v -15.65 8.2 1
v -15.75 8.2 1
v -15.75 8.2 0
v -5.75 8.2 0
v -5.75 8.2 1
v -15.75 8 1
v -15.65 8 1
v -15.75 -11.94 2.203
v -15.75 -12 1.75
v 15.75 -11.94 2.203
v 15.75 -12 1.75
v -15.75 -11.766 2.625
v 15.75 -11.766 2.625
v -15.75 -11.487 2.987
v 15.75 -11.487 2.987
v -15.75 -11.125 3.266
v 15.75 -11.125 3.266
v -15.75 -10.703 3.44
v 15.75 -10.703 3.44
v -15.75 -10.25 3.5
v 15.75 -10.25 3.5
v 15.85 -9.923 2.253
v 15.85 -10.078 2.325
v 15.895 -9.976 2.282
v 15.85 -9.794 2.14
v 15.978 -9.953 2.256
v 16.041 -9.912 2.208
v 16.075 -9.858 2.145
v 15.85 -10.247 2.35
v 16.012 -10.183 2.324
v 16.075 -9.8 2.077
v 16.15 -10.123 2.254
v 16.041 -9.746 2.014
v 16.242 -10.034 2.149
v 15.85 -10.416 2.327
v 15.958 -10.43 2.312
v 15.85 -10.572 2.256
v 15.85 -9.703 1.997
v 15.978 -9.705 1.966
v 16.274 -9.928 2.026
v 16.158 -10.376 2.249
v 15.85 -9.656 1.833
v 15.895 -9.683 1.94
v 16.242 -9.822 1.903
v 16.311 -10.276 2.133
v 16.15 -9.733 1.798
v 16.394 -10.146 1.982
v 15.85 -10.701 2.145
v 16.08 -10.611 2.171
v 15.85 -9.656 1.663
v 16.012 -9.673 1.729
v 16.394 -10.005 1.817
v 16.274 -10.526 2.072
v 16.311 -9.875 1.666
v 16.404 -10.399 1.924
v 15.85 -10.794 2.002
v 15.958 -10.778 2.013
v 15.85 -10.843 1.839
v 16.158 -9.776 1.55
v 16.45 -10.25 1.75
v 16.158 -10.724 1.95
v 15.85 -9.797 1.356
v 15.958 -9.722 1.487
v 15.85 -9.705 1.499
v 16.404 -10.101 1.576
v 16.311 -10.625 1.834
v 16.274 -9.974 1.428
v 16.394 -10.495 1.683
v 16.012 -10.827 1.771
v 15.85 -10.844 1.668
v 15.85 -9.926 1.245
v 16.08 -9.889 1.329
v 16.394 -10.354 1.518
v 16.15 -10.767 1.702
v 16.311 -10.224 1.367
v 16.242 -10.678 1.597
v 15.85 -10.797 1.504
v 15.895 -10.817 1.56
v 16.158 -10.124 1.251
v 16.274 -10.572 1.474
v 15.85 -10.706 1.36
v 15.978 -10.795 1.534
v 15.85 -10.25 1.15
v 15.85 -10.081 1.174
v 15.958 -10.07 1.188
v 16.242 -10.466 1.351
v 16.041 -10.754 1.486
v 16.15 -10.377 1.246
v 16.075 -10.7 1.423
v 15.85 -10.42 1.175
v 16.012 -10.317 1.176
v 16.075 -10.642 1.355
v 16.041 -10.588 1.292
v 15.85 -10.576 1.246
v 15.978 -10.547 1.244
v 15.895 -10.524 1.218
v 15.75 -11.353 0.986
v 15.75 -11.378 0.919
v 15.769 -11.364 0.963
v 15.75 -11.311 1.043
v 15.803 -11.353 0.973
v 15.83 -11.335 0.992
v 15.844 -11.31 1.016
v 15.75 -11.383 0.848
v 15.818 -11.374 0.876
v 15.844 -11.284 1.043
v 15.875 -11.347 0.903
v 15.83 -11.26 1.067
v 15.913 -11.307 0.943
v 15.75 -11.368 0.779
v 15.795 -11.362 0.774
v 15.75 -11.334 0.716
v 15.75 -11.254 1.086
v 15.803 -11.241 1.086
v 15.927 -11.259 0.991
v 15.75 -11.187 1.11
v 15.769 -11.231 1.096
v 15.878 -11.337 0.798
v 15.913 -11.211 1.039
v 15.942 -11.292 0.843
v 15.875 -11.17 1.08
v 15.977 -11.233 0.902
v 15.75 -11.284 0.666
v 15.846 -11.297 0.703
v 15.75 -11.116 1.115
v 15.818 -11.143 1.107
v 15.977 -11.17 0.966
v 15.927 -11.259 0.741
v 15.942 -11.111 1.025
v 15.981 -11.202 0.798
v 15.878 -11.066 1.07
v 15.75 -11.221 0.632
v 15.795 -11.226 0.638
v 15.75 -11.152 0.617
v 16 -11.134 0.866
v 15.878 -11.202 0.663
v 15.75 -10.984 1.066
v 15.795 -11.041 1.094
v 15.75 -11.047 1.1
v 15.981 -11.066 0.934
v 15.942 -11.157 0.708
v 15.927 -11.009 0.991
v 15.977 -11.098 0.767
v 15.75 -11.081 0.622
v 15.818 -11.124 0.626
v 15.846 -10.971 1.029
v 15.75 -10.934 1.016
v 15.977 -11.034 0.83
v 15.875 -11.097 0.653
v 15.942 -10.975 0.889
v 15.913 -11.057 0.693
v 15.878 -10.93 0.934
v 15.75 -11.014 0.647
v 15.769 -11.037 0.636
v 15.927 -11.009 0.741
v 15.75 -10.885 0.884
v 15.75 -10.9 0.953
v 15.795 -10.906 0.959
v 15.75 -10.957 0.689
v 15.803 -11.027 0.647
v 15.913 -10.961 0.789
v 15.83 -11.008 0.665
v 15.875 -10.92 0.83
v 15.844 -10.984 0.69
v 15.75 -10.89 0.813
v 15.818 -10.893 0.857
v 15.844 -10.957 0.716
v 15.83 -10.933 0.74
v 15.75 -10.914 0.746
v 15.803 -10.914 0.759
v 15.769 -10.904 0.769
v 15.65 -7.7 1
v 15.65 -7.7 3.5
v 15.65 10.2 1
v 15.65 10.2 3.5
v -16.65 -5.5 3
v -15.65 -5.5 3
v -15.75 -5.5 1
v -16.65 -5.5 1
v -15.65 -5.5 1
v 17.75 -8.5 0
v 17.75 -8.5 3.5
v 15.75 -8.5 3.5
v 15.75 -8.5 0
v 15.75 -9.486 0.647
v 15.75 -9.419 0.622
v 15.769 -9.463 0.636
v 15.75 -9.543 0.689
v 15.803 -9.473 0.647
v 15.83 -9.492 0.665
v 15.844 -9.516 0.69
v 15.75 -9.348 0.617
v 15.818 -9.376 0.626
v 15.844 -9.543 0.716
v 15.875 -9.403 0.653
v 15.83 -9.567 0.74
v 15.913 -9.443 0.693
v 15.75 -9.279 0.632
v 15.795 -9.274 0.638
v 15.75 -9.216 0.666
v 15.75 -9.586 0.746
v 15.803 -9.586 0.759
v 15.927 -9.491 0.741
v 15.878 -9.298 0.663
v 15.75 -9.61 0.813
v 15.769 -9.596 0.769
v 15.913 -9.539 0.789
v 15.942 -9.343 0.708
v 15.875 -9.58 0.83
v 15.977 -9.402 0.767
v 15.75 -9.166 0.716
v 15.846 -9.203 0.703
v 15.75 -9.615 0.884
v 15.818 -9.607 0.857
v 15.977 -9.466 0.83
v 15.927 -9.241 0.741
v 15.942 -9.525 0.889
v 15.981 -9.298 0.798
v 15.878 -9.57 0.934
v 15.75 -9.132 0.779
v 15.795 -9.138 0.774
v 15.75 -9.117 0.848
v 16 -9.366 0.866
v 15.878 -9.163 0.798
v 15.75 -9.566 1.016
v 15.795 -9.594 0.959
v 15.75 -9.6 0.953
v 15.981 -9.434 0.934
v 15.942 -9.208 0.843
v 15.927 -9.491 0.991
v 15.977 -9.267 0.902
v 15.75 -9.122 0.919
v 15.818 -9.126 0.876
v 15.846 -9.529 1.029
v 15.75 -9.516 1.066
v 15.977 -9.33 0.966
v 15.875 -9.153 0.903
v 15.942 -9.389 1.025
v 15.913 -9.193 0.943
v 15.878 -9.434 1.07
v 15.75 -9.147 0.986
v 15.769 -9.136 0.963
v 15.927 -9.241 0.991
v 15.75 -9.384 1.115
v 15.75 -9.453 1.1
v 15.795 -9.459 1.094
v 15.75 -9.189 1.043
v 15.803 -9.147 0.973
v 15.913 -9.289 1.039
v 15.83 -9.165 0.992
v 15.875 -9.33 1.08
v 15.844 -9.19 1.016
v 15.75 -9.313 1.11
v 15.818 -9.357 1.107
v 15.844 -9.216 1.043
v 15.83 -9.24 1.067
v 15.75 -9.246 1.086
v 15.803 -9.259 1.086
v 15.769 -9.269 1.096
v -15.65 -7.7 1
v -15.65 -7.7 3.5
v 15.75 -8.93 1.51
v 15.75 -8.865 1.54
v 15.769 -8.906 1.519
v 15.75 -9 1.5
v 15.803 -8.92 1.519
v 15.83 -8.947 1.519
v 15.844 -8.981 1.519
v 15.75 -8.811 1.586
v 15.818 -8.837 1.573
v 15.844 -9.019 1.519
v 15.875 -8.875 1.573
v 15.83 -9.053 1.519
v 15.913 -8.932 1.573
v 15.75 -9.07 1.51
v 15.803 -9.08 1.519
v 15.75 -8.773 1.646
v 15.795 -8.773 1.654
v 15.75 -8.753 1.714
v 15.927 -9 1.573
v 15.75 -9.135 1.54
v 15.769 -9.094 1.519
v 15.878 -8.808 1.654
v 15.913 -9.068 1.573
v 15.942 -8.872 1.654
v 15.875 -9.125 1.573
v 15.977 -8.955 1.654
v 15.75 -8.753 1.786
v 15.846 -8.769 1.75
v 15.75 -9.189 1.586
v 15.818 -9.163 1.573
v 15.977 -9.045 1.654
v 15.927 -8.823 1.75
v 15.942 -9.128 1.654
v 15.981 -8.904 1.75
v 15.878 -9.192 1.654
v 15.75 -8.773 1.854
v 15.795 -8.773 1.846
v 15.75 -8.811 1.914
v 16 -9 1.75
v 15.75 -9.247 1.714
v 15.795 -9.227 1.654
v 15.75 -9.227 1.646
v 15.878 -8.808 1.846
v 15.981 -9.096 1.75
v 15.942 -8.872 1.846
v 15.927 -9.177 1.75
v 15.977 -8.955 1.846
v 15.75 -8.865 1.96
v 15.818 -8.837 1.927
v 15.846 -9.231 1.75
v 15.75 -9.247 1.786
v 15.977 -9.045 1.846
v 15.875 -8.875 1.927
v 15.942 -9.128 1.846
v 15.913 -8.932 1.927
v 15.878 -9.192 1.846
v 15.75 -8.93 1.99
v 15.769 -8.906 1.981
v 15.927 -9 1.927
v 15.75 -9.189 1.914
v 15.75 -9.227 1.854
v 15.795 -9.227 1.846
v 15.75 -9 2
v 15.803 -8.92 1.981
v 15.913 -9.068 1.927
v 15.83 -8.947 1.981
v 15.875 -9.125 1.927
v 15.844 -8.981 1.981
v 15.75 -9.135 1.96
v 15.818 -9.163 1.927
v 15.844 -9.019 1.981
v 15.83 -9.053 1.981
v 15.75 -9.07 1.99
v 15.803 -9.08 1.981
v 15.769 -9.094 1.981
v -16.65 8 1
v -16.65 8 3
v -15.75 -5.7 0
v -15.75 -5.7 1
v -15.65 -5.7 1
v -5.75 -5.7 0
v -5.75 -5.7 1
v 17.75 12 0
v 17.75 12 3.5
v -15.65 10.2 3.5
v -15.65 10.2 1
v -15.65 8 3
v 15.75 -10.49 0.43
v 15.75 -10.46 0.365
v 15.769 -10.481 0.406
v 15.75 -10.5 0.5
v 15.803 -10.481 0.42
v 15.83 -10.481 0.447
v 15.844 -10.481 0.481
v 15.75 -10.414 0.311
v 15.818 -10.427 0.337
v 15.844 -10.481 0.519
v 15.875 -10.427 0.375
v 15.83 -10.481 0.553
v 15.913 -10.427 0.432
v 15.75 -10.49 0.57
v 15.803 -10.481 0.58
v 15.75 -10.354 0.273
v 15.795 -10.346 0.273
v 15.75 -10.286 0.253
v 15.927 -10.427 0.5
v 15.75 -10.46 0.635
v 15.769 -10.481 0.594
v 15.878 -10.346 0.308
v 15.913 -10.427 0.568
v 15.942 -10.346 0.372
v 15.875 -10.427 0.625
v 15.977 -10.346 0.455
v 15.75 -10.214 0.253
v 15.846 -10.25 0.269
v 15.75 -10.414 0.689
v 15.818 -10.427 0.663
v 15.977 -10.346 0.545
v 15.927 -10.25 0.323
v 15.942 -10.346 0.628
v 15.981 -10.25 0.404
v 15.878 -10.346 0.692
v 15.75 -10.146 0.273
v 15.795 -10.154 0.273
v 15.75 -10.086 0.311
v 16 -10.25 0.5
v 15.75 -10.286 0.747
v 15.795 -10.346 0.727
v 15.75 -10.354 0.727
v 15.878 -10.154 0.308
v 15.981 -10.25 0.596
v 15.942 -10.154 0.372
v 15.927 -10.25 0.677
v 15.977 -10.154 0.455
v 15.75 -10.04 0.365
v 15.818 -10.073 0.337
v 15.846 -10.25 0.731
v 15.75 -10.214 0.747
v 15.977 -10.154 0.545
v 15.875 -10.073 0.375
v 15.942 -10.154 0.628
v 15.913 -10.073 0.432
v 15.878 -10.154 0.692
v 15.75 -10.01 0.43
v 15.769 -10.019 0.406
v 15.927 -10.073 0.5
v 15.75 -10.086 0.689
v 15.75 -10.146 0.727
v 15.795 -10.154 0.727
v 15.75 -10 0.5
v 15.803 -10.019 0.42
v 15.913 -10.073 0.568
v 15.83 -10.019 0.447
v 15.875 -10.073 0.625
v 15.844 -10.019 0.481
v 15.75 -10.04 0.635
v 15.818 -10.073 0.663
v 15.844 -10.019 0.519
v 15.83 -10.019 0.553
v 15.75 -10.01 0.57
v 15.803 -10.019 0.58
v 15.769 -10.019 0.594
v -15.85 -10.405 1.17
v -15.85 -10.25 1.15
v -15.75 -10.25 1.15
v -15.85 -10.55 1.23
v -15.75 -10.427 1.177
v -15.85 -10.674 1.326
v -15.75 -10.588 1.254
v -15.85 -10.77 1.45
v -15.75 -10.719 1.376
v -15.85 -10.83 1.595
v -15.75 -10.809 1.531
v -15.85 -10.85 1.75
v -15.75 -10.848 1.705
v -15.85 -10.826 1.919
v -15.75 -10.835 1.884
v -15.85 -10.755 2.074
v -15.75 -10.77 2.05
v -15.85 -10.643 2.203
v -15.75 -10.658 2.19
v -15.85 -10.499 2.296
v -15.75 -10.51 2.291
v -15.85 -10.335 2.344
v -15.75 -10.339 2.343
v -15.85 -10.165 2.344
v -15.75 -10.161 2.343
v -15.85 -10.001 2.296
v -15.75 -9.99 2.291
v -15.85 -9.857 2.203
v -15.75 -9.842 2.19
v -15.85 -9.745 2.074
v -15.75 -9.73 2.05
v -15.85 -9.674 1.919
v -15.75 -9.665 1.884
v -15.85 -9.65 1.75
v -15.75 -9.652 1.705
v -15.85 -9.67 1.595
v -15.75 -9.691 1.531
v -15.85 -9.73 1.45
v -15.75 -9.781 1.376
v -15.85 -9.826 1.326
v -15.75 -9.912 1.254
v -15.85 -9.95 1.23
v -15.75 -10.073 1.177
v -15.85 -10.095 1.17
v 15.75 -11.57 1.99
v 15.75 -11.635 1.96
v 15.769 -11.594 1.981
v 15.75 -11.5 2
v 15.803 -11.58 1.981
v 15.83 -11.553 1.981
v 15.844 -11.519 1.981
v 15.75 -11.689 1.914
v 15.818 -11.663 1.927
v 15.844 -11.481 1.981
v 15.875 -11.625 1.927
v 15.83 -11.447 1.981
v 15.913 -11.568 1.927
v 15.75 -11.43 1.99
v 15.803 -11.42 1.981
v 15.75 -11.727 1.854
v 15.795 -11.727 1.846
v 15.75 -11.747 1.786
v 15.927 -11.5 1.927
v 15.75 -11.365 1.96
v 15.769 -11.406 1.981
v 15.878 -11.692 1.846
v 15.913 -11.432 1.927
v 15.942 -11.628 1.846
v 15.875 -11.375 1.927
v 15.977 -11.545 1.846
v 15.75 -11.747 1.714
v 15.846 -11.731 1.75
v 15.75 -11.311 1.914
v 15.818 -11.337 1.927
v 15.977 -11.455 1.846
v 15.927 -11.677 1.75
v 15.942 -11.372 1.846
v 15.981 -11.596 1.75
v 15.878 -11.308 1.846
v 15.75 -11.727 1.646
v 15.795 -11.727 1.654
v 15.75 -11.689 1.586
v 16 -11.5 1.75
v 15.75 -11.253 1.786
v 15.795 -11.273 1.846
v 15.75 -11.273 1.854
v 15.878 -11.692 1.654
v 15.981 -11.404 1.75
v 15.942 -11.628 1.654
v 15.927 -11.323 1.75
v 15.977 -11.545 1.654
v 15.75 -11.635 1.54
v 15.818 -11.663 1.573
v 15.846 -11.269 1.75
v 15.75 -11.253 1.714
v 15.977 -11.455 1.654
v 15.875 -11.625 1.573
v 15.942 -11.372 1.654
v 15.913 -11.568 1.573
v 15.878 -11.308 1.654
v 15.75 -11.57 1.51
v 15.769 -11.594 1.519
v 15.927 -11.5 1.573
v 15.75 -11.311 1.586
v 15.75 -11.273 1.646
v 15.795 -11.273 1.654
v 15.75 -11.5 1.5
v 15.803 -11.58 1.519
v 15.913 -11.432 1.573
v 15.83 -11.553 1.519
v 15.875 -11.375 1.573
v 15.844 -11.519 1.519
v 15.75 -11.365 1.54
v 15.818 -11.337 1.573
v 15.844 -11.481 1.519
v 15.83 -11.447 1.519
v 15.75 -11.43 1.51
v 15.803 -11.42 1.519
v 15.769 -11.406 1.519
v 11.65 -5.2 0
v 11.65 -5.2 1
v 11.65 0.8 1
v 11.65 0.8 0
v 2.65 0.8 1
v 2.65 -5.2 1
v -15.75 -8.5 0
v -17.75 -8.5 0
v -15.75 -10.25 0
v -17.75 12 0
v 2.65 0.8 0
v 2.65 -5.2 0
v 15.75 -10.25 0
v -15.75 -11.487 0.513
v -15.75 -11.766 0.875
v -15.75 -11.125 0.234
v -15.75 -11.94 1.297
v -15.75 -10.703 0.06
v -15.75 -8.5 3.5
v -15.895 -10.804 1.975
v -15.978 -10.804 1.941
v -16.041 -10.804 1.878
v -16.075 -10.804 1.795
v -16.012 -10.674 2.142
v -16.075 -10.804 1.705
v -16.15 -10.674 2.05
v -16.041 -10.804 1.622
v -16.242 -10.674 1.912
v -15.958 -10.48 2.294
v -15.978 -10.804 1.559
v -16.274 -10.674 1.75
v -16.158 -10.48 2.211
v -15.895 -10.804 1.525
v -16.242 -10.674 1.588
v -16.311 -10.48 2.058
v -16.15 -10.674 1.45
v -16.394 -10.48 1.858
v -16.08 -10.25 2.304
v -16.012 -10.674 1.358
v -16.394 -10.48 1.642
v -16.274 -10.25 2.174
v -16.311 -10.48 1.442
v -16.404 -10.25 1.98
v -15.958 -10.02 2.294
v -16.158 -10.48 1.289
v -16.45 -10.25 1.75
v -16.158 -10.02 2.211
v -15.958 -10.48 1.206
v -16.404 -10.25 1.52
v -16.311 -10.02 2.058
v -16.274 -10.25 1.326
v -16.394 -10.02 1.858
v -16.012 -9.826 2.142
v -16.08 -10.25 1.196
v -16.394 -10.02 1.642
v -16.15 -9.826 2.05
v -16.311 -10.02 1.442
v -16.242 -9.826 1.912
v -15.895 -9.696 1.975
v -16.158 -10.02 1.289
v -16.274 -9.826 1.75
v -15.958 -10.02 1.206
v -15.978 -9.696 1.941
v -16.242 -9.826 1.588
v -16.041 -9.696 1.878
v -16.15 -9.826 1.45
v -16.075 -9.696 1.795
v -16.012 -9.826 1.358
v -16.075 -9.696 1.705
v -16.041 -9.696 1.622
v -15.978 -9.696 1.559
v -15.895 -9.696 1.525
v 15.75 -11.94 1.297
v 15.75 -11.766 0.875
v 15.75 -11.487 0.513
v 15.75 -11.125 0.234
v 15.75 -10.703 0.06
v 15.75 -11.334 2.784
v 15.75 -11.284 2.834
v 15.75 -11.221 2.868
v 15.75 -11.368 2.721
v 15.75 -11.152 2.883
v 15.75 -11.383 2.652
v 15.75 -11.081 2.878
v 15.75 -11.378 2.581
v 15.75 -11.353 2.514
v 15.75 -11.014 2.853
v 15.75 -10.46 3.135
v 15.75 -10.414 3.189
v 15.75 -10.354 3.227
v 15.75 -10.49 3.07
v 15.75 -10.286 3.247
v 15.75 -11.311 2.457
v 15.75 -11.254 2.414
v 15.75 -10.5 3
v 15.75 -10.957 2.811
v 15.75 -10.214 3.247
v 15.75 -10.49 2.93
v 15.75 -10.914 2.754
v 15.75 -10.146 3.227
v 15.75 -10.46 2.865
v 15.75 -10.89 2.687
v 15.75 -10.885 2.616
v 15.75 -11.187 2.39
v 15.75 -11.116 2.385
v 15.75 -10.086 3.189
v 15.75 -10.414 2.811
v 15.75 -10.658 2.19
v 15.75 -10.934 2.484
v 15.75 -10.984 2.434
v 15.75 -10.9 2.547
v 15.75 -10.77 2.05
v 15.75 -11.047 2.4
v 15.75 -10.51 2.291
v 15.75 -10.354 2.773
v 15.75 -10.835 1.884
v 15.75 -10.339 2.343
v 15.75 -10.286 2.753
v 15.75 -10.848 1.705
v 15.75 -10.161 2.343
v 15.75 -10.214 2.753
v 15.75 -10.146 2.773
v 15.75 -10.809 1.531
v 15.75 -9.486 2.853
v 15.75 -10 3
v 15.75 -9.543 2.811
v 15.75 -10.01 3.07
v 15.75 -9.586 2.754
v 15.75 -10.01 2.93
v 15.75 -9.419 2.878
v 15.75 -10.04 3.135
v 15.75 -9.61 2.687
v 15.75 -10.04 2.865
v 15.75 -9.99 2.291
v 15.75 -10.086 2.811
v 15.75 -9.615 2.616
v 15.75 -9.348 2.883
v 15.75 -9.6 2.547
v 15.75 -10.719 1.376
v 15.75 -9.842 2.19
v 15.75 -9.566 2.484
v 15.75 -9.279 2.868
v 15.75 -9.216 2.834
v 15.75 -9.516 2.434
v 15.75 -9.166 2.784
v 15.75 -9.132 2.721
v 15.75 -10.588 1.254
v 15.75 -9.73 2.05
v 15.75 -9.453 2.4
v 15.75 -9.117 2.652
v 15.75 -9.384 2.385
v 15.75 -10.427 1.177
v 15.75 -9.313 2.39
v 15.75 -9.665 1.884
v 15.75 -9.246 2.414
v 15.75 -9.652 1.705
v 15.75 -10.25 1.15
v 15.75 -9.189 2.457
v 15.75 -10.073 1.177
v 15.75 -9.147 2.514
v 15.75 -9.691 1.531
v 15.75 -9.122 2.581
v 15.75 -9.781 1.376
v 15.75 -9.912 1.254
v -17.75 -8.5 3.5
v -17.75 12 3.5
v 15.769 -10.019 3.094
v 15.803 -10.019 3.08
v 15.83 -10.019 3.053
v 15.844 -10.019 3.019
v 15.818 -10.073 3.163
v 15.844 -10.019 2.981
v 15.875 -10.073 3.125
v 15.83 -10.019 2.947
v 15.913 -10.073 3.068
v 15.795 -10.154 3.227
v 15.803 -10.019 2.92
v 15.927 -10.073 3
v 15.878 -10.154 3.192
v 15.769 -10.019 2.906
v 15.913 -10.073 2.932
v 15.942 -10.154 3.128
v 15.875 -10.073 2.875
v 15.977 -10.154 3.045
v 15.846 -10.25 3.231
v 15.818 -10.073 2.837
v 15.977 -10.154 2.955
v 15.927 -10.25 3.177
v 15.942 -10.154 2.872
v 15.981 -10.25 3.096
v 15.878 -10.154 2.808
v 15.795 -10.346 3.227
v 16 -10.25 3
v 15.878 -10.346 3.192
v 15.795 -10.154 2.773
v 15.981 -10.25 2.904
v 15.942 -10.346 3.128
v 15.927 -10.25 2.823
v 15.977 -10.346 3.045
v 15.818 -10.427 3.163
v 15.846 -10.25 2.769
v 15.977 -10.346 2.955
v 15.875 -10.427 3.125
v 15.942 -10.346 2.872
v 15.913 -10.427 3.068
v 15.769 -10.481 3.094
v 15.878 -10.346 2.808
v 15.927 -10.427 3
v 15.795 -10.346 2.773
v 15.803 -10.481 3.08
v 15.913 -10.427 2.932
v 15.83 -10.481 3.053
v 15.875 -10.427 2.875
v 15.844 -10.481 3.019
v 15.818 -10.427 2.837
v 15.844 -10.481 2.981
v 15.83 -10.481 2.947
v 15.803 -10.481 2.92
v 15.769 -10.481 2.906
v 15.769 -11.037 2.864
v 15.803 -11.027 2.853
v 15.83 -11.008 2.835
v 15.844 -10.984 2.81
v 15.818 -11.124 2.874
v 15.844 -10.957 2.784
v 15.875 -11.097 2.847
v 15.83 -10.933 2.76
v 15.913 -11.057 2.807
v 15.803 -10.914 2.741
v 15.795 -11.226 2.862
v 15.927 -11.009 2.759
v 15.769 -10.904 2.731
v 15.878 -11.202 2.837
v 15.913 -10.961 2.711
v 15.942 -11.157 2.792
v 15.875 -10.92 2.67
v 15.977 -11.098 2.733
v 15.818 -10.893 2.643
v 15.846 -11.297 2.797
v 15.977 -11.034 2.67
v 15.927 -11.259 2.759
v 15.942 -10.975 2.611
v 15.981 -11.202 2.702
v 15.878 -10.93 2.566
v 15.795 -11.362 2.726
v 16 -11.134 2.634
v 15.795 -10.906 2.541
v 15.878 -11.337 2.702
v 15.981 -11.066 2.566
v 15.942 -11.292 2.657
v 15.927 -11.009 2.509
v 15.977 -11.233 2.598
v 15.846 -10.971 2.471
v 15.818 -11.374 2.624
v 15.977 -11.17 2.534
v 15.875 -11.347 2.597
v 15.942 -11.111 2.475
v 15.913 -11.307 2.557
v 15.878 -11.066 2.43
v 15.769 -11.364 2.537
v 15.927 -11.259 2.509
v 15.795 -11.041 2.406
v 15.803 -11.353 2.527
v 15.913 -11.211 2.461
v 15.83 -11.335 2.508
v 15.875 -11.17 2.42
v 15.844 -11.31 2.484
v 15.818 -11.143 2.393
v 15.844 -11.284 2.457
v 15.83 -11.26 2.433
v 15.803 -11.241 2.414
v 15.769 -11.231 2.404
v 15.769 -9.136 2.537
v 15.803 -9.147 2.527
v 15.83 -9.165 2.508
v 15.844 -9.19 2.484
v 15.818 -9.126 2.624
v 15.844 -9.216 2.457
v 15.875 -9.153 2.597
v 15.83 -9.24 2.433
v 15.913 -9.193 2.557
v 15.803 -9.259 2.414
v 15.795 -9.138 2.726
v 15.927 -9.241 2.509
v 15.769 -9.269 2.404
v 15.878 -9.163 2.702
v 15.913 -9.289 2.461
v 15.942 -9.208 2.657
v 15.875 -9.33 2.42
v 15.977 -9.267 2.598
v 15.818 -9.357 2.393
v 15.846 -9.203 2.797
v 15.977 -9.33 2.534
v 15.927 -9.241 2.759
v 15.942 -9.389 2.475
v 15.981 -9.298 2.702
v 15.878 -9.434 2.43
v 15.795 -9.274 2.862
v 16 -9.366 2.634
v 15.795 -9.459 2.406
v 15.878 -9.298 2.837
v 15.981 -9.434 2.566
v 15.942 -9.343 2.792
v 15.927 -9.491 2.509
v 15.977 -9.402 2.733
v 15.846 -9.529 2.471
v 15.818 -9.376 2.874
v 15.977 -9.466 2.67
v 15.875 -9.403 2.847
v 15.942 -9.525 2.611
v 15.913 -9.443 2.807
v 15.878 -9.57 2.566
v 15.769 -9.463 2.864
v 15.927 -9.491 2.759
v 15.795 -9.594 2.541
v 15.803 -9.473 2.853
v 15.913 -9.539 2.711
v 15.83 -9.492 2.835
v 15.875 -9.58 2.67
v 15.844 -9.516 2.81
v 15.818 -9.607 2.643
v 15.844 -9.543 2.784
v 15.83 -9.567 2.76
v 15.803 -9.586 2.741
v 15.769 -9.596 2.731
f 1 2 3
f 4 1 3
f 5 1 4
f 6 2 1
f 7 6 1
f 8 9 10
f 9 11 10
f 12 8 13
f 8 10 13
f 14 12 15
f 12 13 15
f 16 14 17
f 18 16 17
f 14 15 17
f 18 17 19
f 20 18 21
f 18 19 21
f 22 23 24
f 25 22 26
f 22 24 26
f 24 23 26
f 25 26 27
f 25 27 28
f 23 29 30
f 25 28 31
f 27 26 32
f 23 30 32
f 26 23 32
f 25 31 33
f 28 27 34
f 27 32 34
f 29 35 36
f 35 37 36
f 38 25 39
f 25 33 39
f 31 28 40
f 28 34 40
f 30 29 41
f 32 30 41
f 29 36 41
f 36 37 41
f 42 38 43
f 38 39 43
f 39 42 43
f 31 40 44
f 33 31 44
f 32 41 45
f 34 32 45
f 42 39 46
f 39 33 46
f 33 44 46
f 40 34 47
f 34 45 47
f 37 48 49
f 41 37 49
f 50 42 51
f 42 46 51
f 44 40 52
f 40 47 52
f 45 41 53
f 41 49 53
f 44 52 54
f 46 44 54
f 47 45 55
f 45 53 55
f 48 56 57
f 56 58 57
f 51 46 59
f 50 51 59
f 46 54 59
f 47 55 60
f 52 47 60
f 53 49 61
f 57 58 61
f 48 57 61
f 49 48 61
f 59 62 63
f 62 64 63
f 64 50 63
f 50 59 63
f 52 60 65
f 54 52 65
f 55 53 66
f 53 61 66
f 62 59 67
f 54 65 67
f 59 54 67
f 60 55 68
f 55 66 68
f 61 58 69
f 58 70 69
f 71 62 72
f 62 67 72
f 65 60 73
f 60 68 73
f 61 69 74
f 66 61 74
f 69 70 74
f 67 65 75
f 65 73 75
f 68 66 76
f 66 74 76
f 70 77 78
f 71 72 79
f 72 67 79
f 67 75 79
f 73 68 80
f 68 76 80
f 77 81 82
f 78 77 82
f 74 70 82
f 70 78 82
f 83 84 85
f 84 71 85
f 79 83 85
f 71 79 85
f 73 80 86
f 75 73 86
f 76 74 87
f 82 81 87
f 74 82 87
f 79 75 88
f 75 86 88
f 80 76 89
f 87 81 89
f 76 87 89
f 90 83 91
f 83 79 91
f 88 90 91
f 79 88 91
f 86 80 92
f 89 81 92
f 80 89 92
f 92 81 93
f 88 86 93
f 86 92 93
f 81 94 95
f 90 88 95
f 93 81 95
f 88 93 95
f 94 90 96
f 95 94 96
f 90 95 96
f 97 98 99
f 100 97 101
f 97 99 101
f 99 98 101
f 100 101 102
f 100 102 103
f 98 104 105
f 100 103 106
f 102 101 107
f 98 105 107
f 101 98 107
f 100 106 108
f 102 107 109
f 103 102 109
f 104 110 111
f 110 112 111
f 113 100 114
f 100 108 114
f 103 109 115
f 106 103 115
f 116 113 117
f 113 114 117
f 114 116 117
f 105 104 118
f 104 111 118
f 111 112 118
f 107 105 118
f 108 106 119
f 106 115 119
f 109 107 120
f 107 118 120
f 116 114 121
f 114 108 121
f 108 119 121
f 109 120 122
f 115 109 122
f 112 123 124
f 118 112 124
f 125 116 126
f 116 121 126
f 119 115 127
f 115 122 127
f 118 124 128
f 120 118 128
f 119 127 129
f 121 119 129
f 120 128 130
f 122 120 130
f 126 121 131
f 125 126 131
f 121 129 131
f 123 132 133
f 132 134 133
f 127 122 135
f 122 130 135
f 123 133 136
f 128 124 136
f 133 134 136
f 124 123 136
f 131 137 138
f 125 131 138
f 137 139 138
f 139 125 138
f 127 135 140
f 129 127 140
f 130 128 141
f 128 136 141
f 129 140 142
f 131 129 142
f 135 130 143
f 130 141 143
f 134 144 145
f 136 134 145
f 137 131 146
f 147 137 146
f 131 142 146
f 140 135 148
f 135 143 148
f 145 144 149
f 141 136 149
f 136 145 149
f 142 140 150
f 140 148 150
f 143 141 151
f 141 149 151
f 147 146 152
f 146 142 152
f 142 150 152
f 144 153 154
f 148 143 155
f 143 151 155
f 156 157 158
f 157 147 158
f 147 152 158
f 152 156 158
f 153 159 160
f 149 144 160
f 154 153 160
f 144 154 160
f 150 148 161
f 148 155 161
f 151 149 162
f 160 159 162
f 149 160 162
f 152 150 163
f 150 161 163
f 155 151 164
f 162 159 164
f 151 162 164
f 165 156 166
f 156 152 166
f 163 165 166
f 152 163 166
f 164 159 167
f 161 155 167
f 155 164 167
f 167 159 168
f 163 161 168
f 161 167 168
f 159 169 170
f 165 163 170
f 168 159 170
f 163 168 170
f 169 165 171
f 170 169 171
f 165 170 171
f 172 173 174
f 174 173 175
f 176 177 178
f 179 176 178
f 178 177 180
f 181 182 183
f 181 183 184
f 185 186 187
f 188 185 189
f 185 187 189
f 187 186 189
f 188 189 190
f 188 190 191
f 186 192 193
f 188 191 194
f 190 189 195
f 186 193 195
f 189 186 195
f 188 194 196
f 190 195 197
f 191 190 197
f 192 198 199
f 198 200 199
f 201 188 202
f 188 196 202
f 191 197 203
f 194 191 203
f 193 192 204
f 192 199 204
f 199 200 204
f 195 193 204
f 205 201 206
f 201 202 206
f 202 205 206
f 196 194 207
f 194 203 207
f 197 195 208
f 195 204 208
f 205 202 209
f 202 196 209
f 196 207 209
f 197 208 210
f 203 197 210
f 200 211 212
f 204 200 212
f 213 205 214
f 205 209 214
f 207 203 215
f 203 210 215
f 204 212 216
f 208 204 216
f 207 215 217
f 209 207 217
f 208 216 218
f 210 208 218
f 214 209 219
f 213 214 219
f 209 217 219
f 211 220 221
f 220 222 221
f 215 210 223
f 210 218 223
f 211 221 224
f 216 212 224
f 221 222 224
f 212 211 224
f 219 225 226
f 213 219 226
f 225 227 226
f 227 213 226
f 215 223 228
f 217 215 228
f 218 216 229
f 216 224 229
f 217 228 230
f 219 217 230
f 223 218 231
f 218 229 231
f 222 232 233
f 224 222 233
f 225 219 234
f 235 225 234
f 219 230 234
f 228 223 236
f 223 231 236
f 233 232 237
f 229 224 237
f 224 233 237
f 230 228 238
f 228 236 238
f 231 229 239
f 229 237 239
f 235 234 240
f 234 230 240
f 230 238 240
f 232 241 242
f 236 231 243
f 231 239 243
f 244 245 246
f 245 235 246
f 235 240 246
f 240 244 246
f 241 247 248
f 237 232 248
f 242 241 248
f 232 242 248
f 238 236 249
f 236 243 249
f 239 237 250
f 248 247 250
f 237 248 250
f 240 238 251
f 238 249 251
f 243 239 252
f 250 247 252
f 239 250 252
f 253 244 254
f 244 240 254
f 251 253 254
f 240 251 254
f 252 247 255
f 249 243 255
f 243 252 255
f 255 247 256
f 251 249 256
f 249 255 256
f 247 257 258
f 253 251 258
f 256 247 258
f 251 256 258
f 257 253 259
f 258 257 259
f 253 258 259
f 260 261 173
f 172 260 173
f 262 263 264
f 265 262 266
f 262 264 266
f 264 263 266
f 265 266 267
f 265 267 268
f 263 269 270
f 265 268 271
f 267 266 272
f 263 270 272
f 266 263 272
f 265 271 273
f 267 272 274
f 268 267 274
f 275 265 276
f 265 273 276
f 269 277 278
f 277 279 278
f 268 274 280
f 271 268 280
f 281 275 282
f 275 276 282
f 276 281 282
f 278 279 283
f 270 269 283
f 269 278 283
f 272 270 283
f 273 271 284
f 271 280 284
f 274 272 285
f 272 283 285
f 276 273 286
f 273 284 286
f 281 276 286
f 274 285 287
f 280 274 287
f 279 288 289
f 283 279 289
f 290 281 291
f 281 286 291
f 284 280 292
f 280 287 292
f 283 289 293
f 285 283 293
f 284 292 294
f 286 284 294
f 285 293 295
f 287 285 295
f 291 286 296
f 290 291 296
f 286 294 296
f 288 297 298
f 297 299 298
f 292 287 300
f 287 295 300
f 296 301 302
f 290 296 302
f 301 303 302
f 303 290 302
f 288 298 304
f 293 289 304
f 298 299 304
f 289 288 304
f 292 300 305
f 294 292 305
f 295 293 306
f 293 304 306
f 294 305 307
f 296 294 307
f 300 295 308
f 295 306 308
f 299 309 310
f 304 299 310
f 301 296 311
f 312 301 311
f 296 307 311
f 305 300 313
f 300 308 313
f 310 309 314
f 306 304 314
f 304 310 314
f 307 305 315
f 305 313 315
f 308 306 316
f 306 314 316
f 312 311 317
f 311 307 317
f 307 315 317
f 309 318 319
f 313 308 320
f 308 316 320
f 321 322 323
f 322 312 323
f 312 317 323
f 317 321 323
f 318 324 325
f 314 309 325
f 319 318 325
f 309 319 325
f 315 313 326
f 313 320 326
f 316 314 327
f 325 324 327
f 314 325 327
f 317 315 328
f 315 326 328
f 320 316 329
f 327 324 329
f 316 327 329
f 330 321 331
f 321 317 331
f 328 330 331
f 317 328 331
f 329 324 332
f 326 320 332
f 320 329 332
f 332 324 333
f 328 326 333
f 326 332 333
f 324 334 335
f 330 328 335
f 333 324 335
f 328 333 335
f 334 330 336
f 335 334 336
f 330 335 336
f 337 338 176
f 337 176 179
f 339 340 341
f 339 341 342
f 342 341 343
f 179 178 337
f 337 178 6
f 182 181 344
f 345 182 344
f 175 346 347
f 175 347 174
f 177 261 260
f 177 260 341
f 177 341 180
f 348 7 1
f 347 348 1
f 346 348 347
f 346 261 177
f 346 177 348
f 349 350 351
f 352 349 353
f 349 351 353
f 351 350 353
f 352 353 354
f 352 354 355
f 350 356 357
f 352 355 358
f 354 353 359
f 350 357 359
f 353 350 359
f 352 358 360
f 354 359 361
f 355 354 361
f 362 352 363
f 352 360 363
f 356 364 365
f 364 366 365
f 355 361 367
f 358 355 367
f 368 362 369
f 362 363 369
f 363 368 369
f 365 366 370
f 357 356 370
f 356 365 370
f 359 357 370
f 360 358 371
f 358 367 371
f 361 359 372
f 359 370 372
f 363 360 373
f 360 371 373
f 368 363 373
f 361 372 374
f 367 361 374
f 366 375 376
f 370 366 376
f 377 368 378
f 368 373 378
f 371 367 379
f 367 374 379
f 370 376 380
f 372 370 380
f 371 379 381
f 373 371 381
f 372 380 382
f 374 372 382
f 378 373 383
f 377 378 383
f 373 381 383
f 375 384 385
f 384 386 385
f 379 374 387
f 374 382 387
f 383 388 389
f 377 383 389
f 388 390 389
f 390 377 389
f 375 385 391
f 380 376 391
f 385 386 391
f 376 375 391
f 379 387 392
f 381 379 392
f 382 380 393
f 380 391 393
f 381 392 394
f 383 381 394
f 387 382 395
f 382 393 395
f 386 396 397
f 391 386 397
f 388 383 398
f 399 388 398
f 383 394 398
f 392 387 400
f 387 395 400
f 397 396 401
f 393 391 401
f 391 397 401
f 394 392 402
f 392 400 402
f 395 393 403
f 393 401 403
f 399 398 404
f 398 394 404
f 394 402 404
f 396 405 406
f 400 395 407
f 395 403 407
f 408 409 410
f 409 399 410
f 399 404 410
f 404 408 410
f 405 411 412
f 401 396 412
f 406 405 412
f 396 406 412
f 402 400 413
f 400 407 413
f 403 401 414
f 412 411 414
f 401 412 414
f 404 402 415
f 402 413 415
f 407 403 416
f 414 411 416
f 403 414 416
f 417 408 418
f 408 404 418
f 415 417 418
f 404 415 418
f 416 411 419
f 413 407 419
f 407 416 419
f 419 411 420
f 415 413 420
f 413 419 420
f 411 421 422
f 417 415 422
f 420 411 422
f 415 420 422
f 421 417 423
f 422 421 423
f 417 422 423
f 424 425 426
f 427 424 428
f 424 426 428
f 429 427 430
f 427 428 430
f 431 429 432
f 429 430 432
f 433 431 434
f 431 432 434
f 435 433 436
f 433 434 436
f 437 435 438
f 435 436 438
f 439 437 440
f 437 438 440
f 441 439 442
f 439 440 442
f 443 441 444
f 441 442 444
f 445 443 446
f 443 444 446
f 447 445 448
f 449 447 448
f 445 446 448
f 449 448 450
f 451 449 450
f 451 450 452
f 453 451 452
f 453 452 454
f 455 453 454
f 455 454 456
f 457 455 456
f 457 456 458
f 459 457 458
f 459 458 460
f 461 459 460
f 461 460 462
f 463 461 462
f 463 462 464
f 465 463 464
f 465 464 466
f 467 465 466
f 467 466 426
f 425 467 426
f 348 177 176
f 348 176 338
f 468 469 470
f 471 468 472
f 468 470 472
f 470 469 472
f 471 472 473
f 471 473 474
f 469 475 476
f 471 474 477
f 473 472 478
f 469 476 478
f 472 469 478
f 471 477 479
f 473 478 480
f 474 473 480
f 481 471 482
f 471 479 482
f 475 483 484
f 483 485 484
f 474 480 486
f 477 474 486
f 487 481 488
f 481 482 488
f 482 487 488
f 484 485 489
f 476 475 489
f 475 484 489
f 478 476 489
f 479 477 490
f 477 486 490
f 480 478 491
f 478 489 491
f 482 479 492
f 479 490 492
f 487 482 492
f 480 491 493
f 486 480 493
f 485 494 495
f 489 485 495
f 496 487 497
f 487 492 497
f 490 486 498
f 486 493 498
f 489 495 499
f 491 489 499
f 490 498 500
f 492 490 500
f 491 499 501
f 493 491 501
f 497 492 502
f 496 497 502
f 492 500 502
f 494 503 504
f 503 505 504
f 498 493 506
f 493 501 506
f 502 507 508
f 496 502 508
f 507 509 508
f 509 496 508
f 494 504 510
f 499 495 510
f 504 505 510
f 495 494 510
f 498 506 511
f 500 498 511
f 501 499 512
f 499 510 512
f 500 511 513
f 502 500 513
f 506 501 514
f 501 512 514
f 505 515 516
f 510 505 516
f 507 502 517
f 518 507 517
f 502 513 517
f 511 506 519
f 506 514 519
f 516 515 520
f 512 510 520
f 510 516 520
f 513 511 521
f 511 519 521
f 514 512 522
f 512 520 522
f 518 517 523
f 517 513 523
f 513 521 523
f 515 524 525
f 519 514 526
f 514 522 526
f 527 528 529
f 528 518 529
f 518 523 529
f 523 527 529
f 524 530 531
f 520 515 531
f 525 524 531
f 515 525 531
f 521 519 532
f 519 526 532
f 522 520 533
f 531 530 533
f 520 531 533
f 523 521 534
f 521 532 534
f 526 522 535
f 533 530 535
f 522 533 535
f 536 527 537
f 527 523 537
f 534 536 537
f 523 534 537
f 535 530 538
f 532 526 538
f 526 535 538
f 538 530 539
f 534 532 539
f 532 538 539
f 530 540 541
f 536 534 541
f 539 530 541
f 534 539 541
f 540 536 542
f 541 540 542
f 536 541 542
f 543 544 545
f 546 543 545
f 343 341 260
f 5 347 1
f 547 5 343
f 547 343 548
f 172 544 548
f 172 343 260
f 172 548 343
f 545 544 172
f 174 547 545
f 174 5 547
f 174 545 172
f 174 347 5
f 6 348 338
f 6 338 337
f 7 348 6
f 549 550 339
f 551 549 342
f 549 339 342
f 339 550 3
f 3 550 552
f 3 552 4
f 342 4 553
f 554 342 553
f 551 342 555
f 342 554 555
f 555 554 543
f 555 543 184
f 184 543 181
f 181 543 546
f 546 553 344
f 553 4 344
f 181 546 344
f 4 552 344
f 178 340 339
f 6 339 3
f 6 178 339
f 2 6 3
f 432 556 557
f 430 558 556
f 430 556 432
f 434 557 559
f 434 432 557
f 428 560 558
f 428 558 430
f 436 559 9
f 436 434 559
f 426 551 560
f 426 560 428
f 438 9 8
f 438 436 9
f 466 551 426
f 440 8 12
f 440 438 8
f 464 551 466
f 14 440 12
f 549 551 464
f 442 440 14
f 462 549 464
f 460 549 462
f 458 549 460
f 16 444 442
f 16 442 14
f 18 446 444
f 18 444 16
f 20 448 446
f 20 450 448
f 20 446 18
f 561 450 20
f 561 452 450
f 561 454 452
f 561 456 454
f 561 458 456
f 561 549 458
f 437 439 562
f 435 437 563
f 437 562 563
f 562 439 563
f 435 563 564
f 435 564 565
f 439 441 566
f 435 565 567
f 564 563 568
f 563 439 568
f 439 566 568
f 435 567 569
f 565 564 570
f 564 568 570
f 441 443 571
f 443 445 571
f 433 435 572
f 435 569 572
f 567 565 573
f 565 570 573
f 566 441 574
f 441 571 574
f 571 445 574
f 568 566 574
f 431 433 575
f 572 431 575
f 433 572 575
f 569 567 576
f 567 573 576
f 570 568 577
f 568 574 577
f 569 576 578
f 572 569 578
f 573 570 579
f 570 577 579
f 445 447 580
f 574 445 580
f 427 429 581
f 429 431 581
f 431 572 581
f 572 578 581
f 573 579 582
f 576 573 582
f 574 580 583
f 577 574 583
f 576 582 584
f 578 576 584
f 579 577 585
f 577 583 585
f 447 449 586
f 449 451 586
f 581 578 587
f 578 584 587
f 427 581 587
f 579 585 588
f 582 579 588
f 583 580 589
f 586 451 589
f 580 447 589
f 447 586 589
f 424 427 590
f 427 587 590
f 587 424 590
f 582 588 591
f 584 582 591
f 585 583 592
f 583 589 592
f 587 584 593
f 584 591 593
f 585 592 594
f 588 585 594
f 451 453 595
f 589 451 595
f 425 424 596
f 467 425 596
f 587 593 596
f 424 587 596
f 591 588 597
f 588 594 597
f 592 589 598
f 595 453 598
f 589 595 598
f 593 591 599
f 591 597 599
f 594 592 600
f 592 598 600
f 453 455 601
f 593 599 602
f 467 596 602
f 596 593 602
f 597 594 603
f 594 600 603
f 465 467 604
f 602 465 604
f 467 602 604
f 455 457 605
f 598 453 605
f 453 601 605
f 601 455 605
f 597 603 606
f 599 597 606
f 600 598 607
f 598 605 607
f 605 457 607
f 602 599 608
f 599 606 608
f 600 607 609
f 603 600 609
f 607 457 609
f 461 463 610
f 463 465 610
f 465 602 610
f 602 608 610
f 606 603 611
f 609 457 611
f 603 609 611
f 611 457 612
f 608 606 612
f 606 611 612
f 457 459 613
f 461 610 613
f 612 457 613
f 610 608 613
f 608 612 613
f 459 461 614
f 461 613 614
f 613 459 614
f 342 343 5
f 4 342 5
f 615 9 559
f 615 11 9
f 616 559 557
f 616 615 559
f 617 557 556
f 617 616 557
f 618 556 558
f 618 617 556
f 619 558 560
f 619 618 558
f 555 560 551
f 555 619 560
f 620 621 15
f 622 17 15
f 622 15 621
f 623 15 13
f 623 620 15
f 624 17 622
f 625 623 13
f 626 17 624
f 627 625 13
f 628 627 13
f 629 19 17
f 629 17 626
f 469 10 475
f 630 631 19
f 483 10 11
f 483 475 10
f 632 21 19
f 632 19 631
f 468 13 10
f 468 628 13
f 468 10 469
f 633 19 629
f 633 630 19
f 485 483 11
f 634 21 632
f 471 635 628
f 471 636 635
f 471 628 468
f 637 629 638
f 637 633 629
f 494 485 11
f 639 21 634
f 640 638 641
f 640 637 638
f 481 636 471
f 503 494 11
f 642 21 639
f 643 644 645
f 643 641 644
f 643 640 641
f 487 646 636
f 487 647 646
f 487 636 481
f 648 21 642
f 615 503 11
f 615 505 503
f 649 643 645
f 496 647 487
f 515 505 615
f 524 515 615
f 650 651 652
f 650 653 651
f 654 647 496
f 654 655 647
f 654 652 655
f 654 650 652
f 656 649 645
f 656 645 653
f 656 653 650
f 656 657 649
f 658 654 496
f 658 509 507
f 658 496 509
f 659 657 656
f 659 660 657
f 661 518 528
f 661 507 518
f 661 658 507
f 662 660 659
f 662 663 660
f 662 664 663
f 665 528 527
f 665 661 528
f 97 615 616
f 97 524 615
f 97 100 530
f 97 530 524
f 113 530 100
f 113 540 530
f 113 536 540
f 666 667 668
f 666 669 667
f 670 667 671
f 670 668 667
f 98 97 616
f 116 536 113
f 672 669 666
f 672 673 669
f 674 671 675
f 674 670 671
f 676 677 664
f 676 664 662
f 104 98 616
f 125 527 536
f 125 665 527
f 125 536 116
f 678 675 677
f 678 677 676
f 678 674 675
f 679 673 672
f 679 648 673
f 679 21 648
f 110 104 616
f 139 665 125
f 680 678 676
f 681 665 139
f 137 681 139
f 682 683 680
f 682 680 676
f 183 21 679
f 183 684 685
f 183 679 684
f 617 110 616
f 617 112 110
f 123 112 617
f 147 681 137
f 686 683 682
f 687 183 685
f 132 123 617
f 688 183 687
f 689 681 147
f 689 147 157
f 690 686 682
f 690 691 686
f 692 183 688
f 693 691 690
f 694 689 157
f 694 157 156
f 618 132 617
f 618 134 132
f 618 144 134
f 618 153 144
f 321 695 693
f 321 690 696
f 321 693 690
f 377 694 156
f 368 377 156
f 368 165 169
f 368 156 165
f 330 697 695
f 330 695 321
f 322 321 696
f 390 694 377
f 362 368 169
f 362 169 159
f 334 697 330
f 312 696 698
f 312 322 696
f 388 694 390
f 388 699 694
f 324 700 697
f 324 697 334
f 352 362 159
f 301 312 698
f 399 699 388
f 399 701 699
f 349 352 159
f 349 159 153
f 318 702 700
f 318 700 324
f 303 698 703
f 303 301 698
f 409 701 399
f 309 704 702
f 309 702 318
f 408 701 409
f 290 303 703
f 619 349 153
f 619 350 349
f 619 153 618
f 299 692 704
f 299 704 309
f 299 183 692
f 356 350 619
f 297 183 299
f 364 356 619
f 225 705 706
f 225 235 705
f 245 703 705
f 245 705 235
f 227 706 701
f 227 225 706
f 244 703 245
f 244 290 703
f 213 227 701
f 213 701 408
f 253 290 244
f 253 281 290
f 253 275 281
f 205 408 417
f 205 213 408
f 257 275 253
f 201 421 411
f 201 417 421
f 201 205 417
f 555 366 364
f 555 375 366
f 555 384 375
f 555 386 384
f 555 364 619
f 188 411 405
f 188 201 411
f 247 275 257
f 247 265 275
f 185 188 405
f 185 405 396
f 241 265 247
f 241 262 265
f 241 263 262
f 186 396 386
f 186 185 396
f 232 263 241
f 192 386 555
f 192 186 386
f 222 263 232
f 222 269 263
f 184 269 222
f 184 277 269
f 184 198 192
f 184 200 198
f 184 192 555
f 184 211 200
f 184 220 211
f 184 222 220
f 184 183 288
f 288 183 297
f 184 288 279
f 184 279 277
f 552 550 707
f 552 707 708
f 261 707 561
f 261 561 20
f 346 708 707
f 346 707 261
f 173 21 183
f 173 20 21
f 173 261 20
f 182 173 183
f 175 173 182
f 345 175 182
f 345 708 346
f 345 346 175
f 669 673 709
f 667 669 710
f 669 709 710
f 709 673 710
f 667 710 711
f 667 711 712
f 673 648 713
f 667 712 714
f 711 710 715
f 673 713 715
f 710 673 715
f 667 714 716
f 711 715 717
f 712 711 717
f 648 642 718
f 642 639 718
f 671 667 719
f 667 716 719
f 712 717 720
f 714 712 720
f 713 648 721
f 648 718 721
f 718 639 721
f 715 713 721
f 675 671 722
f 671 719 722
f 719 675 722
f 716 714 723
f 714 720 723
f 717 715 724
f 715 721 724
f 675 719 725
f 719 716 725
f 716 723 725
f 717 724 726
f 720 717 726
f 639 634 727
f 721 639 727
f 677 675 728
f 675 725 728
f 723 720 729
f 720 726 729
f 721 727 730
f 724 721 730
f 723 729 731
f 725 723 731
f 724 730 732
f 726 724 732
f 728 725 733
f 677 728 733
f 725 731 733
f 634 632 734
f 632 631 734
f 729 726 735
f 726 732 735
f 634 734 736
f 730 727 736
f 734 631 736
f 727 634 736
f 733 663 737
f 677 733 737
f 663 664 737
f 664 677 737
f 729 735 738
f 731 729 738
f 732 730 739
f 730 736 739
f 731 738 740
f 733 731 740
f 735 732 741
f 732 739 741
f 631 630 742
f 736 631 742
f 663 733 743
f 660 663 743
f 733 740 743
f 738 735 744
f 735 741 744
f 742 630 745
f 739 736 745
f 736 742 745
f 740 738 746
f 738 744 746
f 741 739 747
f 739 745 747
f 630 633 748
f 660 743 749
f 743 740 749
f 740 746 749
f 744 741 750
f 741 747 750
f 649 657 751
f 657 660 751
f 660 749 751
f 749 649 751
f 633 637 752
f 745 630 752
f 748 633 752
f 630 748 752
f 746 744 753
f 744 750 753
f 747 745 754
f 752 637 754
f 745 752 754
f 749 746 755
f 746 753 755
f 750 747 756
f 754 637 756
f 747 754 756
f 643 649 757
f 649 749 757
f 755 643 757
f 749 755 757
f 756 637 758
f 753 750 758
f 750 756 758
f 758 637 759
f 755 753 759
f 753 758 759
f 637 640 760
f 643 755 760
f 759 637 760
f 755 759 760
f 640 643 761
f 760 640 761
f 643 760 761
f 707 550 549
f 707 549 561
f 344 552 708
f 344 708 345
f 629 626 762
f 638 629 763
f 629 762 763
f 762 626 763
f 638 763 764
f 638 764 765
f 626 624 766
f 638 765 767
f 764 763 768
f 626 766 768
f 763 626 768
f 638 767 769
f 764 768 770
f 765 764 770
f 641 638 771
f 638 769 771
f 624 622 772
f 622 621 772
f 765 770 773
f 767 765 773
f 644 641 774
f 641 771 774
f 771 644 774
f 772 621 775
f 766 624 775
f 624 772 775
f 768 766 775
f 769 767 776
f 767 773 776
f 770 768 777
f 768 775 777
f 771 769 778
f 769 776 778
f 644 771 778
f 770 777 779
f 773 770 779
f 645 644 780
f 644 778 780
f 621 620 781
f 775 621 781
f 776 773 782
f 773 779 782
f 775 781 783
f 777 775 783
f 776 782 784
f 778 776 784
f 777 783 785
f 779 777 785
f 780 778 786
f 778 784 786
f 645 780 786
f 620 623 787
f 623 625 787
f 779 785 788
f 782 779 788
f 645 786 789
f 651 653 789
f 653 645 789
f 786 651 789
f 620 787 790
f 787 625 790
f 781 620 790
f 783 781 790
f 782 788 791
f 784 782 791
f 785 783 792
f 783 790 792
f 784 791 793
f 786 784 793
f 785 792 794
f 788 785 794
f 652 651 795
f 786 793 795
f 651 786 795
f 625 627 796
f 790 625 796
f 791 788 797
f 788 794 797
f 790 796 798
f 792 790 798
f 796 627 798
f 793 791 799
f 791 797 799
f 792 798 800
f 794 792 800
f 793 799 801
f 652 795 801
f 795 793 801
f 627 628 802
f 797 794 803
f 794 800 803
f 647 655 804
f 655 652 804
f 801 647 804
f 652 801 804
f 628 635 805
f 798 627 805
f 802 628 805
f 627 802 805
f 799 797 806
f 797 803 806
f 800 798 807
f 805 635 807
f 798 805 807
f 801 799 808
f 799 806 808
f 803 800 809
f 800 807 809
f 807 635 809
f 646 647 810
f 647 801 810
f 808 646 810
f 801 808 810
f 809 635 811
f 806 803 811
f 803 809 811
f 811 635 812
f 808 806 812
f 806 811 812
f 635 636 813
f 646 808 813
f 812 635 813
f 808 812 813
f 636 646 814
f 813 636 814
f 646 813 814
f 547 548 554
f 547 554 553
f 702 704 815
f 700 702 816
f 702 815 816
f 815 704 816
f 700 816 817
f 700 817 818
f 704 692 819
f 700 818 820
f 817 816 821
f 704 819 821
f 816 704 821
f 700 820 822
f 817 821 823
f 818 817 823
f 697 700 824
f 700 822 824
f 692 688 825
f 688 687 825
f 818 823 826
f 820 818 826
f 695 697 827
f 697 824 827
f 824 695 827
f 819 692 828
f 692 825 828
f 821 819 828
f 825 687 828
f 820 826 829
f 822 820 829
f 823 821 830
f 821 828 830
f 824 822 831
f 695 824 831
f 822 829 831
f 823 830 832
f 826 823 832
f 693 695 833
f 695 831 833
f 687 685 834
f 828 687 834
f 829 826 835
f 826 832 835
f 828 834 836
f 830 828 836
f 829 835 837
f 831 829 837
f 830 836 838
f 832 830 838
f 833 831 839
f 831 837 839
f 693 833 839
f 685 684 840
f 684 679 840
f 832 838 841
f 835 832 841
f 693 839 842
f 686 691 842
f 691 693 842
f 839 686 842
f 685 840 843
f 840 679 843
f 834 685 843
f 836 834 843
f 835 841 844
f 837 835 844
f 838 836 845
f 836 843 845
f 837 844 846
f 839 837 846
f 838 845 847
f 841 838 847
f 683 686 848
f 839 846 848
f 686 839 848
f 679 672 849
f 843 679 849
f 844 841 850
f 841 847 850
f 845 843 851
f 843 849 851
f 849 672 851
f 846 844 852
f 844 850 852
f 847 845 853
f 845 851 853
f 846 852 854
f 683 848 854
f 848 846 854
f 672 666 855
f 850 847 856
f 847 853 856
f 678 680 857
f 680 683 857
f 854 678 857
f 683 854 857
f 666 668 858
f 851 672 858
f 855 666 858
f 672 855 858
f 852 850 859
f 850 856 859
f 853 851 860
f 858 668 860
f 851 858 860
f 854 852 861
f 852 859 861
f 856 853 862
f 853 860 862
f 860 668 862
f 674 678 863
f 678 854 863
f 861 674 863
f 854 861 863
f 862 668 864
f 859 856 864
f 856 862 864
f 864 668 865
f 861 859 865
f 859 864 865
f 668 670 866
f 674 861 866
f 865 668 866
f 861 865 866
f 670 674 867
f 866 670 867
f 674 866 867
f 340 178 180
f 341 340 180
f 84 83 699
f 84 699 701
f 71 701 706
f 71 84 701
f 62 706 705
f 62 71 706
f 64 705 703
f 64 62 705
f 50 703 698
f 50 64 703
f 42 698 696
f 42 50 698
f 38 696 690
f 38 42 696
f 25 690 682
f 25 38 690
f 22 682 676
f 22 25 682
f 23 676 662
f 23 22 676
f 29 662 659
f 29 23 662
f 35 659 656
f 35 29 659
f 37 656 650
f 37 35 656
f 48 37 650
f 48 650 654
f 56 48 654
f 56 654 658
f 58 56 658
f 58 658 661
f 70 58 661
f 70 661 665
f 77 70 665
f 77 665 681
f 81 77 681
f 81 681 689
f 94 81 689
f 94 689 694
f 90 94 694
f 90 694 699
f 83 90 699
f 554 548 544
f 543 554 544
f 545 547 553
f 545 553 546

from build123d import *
from build123d.topology import SkipClean

# Parameters (mm, degrees)
SKETCH_1_W               = 35.5
SKETCH_1_H               = 24
EXTRUDE_1_DEPTH          = 3.5
SKETCH_2_W               = 31.3
SKETCH_2_H               = 17.9
CUT_EXTRUDE_1_DEPTH      = 2.5
SKETCH_12_W              = 3.5
SKETCH_12_H              = 3.5
CUT_EXTRUDE_9_DEPTH      = 2
SKETCH_13_W              = 3.5
SKETCH_13_H              = 3.5
CUT_EXTRUDE_10_DEPTH     = 2
SKETCH_14_W              = 10
SKETCH_14_H              = 13.9
CUT_EXTRUDE_11_DEPTH     = 2
SKETCH_18_W              = 2
SKETCH_18_H              = 13.5
CUT_EXTRUDE_12_DEPTH     = 1
SKETCH_19_W              = 9
SKETCH_19_H              = 6
CUT_EXTRUDE_13_DEPTH     = 2
SKETCH_20_R              = 0.6
EXTRUDE_3_DEPTH          = 0.1
EXTRUDE_START            = 0.1
SKETCH_21_R              = 0.6
EXTRUDE_4_DEPTH          = 0.1
FILLET_1_R               = 1.75
FILLET_2_R               = 1.75
PATTERN_CIRCULAR_2_COUNT = 8


with BuildPart() as part:
    # 草图1 → 凸台-拉伸1 (new body)
    with BuildSketch(Plane.XY):
        Rectangle(SKETCH_1_W, SKETCH_1_H)
    extrude(amount=EXTRUDE_1_DEPTH)

    # 草图2 → 切除-拉伸1 (cut)
    with BuildSketch(Plane.XY.offset(3.5)):
        with Locations((0, 1.25)):
            Rectangle(SKETCH_2_W, SKETCH_2_H)
    extrude(amount=-CUT_EXTRUDE_1_DEPTH, mode=Mode.SUBTRACT)

    # 草图12 → 切除-拉伸9 (cut)
    with BuildSketch(Plane.ZY.offset(17.75)):
        with Locations((1.75, -10.25)):
            Rectangle(SKETCH_12_W, SKETCH_12_H)
    extrude(amount=-CUT_EXTRUDE_9_DEPTH, mode=Mode.SUBTRACT)

    # 草图13 → 切除-拉伸10 (cut)
    with BuildSketch(Plane(origin=(17.75, 0, 0), x_dir=(0, 0, -1), z_dir=(1, 0, 0))):
        with Locations((-1.75, -10.25)):
            Rectangle(SKETCH_13_W, SKETCH_13_H)
    extrude(amount=-CUT_EXTRUDE_10_DEPTH, mode=Mode.SUBTRACT)

    # 草图14 → 切除-拉伸11 (cut)
    with BuildSketch(Plane.XY.offset(1)):
        with Locations((-10.75, 1.25)):
            Rectangle(SKETCH_14_W, SKETCH_14_H)
    extrude(amount=-CUT_EXTRUDE_11_DEPTH, mode=Mode.SUBTRACT)

    # 草图18 → 切除-拉伸12 (cut)
    with BuildSketch(Plane(origin=(-15.65, 0, 0), x_dir=(0, 0, -1), z_dir=(1, 0, 0))):
        with Locations((-2, 1.25)):
            Rectangle(SKETCH_18_W, SKETCH_18_H)
    extrude(amount=-CUT_EXTRUDE_12_DEPTH, mode=Mode.SUBTRACT)

    # 草图19 → 切除-拉伸13 (cut)
    with BuildSketch(Plane.XY.offset(1)):
        with Locations((7.15, -2.2)):
            Rectangle(SKETCH_19_W, SKETCH_19_H)
    extrude(amount=-CUT_EXTRUDE_13_DEPTH, mode=Mode.SUBTRACT)

    # 草图20 → 凸台-拉伸3 (add)
    with BuildSketch(Plane.ZY.offset(15.75)):
        with Locations(Location((1.75, -10.25, 0), (0, 0, 180))):
            Circle(SKETCH_20_R)
    extrude(amount=EXTRUDE_3_DEPTH)

    # 草图21 → 凸台-拉伸4 (add)
    with BuildSketch(Plane(origin=(15.75, 0, 0), x_dir=(0, 0, -1), z_dir=(1, 0, 0)).offset(EXTRUDE_START)):
        with Locations((-1.75, -10.25)):
            Circle(SKETCH_21_R)
    extrude(amount=-EXTRUDE_4_DEPTH)

    # 草图23 → 旋转1 (revolve)
    with BuildSketch(Plane.ZY.offset(15.85)):
        with BuildLine():
            Line((1.75, -9.65), (1.75, -10.85))
            ThreePointArc((1.75, -10.85), (2.35, -10.25), (1.75, -9.65))
        make_face()
    revolve(axis=Axis((-15.85, -9.65, 1.75), (0, -1, 0)))

    # 草图24 → 旋转2 (revolve)
    with SkipClean():  # the faces are left unmerged after this step: merging them gives an invalid solid
        with BuildSketch(Plane(origin=(15.85, 0, 0), x_dir=(0, 0, -1), z_dir=(1, 0, 0))):
            with BuildLine():
                ThreePointArc((-2.140499307, -9.794467025), (-2.205532975, -10.640499307), (-1.359500693, -10.705532975))
                Line((-1.359500693, -10.705532975), (-2.140499307, -9.794467025))
            make_face()
            with BuildLine():
                Line((-2.140499307, -9.794467025), (-1.359500693, -10.705532975))
                ThreePointArc((-1.359500693, -10.705532975), (-1.204885524, -10.500699438), (-1.15, -10.25))
                ThreePointArc((-1.15, -10.25), (-1.499300562, -9.704885524), (-2.140499307, -9.794467025))
            make_face()
        revolve(axis=Axis((15.85, -10.705532975, 1.359500693), (0, 0.7592216255630779, 0.65083217750612)))
    add(part.part.scale(1), mode=Mode.REPLACE)  # the faces are merged on a copy

    # 圆角1
    fillet_1_edges = [part.edges().sort_by_distance(p)[0] for p in [
        (0, -12, 3.5),
    ]]
    fillet(fillet_1_edges, radius=FILLET_1_R)

    # 圆角2
    fillet_2_edges = [part.edges().sort_by_distance(p)[0] for p in [
        (0, -12, 0),
    ]]
    fillet(fillet_2_edges, radius=FILLET_2_R - 0.0001)  # a hair under: the kernel refuses the full size

    # 草图25 → 旋转3 (revolve)
    with BuildSketch(Plane(origin=(15.75, 0, 0), x_dir=(0, 0, -1), z_dir=(1, 0, 0))):
        with BuildLine():
            Line((-2, -9), (-1.5, -9))
            ThreePointArc((-1.5, -9), (-1.75, -8.75), (-2, -9))
        make_face()
    revolve_3 = revolve(axis=Axis((15.75, -9, 2), (0, 0, -1)))

    # 阵列(圆周)2: 旋转3 ×8 about axis
    pattern_circular_2_axis = Axis((0, -10.25, 1.75), (1, 0, 0))
    for i in range(1, PATTERN_CIRCULAR_2_COUNT):
        add(revolve_3.rotate(pattern_circular_2_axis, i * 360 / PATTERN_CIRCULAR_2_COUNT))


solid = part.part
